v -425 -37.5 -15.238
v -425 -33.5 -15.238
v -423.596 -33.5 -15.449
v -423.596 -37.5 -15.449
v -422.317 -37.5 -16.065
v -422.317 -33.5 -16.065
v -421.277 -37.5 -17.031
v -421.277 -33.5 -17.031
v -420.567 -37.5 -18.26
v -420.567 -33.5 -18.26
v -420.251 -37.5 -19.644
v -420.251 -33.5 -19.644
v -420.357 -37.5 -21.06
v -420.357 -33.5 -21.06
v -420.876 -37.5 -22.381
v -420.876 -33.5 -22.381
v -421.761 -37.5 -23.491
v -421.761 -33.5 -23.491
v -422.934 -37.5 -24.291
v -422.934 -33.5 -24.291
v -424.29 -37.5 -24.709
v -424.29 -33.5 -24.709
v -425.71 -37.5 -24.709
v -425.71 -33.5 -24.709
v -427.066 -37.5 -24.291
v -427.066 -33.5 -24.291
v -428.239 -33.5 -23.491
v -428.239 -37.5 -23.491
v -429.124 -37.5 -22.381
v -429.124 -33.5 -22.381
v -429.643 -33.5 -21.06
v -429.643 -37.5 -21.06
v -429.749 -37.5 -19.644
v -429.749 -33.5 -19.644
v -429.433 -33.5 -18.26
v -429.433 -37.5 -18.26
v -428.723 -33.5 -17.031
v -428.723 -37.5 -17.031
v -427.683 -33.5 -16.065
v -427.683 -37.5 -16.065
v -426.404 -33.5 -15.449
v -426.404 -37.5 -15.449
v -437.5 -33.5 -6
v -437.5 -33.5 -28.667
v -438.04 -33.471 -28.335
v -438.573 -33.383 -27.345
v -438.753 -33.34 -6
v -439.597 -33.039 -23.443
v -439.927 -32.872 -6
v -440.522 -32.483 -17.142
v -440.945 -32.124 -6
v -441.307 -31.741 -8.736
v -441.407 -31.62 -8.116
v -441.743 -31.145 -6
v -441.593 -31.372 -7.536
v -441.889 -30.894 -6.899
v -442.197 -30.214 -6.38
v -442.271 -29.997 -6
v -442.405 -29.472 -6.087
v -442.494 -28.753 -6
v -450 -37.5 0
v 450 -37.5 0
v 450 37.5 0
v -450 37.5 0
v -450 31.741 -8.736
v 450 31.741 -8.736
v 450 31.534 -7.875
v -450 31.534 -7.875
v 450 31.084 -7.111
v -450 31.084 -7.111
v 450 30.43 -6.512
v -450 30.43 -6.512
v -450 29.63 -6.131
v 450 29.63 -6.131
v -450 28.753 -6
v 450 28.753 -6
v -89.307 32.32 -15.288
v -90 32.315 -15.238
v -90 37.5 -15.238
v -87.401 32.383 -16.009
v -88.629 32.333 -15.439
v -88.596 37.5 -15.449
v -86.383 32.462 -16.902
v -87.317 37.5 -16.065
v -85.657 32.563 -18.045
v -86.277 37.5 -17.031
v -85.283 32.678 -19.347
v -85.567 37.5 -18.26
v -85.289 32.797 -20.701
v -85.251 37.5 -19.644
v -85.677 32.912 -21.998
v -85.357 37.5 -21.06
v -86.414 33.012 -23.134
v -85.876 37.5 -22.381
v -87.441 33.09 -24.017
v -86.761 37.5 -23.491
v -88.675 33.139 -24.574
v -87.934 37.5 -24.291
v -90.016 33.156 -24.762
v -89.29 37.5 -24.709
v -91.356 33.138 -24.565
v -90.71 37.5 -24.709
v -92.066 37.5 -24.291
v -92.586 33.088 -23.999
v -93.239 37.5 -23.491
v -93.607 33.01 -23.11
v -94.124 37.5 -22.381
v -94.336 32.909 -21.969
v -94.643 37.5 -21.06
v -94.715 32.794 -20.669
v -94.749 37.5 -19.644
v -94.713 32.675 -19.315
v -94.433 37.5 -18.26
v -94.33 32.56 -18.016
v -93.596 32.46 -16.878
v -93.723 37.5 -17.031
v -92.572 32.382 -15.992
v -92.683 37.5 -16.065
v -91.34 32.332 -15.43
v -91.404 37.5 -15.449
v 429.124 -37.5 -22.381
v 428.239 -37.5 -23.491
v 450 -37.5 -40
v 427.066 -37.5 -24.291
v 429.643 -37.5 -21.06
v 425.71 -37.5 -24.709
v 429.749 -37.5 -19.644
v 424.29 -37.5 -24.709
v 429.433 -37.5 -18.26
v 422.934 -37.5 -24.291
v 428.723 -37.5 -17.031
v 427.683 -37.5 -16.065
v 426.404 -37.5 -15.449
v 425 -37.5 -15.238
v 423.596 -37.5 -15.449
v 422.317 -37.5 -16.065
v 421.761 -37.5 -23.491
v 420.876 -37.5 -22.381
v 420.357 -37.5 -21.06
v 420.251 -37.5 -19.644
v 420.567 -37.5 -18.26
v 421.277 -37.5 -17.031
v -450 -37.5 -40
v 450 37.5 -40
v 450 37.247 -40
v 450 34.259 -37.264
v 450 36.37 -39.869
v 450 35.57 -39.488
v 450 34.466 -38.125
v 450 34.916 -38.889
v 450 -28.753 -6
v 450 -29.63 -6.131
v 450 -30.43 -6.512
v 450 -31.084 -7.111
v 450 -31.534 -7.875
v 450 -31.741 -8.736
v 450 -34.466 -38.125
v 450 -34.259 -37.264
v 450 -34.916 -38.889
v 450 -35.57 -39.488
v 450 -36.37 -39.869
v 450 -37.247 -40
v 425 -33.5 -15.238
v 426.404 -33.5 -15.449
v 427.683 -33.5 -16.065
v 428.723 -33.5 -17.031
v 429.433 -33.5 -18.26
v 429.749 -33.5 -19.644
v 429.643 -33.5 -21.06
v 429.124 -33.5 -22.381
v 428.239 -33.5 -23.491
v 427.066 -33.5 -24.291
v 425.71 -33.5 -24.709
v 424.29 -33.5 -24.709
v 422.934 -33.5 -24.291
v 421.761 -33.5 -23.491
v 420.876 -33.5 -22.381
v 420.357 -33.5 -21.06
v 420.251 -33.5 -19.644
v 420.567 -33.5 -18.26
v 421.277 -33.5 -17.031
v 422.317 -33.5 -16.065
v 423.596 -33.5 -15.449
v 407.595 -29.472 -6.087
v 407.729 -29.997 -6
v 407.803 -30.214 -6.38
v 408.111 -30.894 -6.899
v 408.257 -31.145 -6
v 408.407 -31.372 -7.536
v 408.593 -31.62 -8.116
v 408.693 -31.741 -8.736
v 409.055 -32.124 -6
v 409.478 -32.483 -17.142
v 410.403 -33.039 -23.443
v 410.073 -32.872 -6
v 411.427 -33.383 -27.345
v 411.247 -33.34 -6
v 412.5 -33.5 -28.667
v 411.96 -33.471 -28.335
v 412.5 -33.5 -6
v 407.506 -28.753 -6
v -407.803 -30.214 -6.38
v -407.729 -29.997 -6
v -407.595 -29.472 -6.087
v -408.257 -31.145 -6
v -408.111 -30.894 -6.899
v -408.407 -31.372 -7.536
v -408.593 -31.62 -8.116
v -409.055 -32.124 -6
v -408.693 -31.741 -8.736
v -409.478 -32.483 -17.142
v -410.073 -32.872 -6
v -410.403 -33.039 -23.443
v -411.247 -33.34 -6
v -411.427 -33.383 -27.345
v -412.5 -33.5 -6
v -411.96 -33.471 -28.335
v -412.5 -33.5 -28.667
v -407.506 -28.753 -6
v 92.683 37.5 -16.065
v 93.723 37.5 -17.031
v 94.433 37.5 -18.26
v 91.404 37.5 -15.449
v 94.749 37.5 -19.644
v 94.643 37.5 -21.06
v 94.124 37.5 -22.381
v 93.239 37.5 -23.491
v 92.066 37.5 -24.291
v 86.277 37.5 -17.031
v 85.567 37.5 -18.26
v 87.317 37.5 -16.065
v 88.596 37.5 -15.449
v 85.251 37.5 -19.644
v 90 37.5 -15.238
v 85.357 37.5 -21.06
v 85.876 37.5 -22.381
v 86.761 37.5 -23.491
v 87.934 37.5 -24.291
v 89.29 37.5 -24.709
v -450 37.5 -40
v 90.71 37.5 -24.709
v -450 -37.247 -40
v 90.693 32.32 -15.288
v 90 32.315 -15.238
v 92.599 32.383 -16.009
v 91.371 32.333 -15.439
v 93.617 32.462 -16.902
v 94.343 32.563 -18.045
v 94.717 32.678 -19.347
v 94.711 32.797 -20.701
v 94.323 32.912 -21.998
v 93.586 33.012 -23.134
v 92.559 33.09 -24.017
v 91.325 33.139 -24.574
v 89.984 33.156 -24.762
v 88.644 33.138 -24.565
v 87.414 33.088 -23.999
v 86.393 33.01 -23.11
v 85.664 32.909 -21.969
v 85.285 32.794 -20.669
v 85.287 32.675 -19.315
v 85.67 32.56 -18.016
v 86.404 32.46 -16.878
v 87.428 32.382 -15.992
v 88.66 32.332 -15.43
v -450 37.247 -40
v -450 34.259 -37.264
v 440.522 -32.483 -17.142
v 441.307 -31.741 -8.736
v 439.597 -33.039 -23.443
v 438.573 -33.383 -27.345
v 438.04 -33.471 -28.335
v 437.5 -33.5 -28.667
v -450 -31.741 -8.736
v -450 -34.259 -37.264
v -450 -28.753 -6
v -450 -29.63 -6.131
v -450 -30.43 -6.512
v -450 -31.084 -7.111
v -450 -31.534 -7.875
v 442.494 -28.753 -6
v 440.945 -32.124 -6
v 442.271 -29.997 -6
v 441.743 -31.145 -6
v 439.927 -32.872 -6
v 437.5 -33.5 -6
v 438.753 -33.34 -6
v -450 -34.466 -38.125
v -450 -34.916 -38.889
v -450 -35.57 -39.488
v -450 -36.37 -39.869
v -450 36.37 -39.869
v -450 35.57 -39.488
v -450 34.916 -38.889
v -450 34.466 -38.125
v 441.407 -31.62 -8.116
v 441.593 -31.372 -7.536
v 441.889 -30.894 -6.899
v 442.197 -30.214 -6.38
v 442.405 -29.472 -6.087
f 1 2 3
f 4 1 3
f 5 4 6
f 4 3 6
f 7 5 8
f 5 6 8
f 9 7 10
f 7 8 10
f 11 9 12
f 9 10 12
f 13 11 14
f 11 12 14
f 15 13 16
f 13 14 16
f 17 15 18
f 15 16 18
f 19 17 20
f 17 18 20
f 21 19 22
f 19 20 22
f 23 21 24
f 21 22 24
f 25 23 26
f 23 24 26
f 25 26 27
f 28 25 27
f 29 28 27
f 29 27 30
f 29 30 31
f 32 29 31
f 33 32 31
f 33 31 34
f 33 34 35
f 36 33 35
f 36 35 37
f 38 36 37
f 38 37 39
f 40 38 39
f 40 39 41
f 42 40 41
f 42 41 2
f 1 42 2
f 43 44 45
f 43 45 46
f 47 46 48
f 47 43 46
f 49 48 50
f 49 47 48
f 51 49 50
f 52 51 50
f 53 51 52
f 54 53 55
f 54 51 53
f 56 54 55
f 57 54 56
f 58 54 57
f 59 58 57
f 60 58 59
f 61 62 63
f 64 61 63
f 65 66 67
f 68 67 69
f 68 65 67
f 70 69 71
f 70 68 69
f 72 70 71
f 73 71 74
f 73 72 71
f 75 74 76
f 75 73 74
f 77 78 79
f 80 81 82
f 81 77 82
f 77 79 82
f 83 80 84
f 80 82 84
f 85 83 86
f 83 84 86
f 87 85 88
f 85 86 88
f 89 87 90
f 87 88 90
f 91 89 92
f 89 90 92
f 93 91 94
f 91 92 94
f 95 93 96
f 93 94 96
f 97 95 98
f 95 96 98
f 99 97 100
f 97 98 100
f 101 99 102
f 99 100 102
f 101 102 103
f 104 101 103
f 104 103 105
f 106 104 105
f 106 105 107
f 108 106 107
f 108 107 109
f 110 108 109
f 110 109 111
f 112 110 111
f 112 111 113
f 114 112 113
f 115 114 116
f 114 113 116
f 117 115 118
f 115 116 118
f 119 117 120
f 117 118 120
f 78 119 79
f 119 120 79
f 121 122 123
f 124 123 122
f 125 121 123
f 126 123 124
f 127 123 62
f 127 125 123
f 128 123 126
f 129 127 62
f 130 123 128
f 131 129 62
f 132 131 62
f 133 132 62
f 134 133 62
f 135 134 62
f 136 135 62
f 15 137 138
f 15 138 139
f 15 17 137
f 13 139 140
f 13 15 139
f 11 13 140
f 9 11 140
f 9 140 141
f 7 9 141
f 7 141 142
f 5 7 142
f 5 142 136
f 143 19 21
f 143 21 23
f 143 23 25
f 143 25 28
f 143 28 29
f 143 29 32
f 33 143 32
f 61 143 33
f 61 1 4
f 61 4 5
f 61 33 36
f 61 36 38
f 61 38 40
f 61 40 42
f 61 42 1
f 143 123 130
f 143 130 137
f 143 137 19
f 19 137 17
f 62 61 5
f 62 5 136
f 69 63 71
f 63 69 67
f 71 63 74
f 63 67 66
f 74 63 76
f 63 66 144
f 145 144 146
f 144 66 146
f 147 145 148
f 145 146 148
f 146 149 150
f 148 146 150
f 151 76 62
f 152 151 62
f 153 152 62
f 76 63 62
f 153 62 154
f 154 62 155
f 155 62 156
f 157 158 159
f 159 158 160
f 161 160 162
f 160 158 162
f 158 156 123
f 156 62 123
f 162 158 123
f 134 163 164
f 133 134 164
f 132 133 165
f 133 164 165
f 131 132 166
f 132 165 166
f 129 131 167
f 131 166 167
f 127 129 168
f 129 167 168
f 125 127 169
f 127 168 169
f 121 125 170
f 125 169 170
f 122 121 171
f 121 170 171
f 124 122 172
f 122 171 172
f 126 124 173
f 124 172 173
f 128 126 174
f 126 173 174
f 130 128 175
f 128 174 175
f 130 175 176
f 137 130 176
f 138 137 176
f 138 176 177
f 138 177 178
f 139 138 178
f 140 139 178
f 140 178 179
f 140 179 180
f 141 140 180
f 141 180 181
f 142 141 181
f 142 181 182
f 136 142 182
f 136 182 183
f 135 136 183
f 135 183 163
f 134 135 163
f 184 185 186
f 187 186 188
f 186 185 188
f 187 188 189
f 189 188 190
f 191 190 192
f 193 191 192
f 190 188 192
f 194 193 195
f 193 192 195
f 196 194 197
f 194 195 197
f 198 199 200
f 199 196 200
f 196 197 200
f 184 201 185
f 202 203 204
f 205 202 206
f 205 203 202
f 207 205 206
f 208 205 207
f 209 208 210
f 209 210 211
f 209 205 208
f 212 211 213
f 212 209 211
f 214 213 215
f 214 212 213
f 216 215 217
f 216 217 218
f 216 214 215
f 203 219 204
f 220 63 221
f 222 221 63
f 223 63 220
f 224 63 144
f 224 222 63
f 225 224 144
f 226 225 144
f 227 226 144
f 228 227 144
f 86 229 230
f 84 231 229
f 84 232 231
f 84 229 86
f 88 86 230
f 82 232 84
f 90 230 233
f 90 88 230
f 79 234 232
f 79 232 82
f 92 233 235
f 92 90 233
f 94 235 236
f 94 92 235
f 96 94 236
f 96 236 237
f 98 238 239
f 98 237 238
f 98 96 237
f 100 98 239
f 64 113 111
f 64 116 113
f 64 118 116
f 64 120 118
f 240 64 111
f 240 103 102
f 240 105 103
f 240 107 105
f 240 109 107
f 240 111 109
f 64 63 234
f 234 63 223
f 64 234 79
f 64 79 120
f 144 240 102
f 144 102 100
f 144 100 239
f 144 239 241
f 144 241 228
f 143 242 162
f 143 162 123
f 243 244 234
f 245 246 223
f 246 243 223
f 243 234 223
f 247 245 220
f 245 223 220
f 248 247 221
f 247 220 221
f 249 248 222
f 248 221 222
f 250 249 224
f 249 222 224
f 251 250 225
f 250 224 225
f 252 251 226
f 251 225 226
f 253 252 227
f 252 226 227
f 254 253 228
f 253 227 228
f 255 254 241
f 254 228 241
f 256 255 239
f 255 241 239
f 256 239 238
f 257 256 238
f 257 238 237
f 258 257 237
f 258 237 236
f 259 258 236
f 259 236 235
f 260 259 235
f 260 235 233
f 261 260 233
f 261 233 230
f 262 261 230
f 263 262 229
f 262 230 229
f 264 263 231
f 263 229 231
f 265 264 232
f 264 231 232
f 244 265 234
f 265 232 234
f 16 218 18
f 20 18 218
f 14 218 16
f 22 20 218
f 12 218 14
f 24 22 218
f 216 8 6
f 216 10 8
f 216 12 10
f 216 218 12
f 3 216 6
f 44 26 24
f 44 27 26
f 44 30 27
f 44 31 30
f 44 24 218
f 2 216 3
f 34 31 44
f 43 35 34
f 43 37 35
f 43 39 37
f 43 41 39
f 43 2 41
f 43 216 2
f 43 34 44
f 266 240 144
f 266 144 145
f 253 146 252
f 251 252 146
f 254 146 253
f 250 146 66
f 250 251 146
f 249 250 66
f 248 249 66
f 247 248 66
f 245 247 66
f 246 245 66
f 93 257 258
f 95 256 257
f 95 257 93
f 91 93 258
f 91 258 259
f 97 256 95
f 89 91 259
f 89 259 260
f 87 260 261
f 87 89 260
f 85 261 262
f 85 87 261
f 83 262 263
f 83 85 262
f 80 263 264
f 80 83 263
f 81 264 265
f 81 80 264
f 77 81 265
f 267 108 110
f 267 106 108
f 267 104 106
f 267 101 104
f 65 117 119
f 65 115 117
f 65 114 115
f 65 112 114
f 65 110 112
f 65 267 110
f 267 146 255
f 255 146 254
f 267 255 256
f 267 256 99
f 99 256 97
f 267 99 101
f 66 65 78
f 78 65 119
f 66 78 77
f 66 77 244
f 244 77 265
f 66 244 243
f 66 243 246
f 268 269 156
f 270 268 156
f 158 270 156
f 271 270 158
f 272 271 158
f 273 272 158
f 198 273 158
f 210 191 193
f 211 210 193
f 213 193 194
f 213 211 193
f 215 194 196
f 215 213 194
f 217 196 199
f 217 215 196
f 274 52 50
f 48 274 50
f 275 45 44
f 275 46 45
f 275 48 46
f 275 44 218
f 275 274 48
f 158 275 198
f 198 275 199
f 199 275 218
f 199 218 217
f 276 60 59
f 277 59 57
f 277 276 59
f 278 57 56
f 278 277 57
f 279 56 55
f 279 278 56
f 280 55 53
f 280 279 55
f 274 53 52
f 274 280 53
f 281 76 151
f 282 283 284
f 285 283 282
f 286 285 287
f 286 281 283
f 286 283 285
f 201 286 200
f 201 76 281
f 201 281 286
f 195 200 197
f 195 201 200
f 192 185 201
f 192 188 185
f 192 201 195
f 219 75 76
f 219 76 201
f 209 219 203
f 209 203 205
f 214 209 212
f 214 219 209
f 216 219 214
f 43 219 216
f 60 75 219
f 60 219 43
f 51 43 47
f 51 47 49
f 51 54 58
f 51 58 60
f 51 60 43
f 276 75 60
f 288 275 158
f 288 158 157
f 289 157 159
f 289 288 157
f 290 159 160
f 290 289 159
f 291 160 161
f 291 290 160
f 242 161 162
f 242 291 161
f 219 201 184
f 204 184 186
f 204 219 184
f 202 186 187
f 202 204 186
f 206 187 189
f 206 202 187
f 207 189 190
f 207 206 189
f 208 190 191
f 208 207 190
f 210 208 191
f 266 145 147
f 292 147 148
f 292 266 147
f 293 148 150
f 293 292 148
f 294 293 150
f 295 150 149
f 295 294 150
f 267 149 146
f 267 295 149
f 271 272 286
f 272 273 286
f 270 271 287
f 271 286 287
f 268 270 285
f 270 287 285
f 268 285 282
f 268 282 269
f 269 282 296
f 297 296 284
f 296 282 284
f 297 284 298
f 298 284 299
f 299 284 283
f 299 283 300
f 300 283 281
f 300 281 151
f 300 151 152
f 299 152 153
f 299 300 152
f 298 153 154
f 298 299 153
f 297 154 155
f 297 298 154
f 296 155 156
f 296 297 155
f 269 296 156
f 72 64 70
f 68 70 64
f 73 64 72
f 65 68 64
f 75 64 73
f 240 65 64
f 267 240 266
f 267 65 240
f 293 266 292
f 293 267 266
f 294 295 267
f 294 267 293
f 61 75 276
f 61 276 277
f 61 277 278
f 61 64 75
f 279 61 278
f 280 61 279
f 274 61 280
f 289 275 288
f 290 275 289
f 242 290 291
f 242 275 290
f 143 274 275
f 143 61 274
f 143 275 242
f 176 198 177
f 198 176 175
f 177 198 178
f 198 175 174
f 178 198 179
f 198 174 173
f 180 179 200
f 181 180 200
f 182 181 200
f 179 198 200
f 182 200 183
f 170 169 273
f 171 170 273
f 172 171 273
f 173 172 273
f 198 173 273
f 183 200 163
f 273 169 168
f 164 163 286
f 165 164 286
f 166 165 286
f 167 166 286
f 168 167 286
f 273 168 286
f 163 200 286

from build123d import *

# Parameters (mm, degrees)
STRUCTURAL_MEMBER1_DEPTH = 900
SKETCH12_R               = 4.7625
CUT_EXTRUDE1_DEPTH       = 454.327971782
CUT_EXTRUDE2_DEPTH       = 40
SKETCH18_R               = 4.7625
CUT_EXTRUDE3_DEPTH       = 10


with BuildPart() as part:
    # Sketch17 → Structural Member1 (new body)
    with BuildSketch(Plane(origin=(-450, 0, 0), x_dir=(0, 0, 1), z_dir=(1, 0, 0))):
        with BuildLine():
            Line((0, 37.5), (0, -37.5))
            Line((0, -37.5), (-40, -37.5))
            Line((-40, -37.5), (-40, -37.246949676))
            ThreePointArc((-40, -37.246949676), (-39.212582687, -35.220998578), (-37.263681431, -34.258560126))
            Line((-37.263681431, -34.258560126), (-8.736318569, -31.741439874))
            ThreePointArc((-8.736318569, -31.741439874), (-6.787417313, -30.779001422), (-6, -28.753050324))
            Line((-6, -28.753050324), (-6, 28.753050324))
            ThreePointArc((-6, 28.753050324), (-6.787417313, 30.779001422), (-8.736318569, 31.741439874))
            Line((-8.736318569, 31.741439874), (-37.263681431, 34.258560126))
            ThreePointArc((-37.263681431, 34.258560126), (-39.212582687, 35.220998578), (-40, 37.246949676))
            Line((-40, 37.246949676), (-40, 37.5))
            Line((-40, 37.5), (0, 37.5))
        make_face()
    extrude(amount=STRUCTURAL_MEMBER1_DEPTH)

    # Sketch12 → Cut-Extrude1 (cut, through all)
    with BuildSketch(Plane(origin=(0, 0, 0), x_dir=(1, 0, 0), z_dir=(0, 1, 0))):
        with Locations(Location((-425, 20, 0), (0, 0, 270))):
            Circle(SKETCH12_R)
        with Locations(Location((425, 20, 0), (0, 0, 270))):
            Circle(SKETCH12_R)
    extrude(amount=-CUT_EXTRUDE1_DEPTH, mode=Mode.SUBTRACT)

    # Sketch15 → Cut-Extrude2 (cut)
    with BuildSketch(Plane(origin=(0, 0, -6), x_dir=(-1, 0, 0), z_dir=(0, 0, -1))):
        with BuildLine():
            Line((-412.5, -33.5), (-437.5, -33.5))
            ThreePointArc((-437.5, -33.5), (-442.5, -28.5), (-437.5, -23.5))
            Line((-437.5, -23.5), (-412.5, -23.5))
            ThreePointArc((-412.5, -23.5), (-407.5, -28.5), (-412.5, -33.5))
        make_face()
        with BuildLine():
            Line((412.5, -33.5), (437.5, -33.5))
            ThreePointArc((437.5, -33.5), (442.5, -28.5), (437.5, -23.5))
            Line((437.5, -23.5), (412.5, -23.5))
            ThreePointArc((412.5, -23.5), (407.5, -28.5), (412.5, -33.5))
        make_face()
    extrude(amount=CUT_EXTRUDE2_DEPTH, mode=Mode.SUBTRACT)

    # Sketch18 → Cut-Extrude3 (cut)
    with BuildSketch(Plane(origin=(0, 37.5, 0), x_dir=(1, 0, 0), z_dir=(0, 1, 0))):
        with Locations(Location((90, 20, 0), (0, 0, 270))):
            Circle(SKETCH18_R)
        with Locations(Location((-90, 20, 0), (0, 0, 270))):
            Circle(SKETCH18_R)
    extrude(amount=-CUT_EXTRUDE3_DEPTH, mode=Mode.SUBTRACT)


solid = part.part
